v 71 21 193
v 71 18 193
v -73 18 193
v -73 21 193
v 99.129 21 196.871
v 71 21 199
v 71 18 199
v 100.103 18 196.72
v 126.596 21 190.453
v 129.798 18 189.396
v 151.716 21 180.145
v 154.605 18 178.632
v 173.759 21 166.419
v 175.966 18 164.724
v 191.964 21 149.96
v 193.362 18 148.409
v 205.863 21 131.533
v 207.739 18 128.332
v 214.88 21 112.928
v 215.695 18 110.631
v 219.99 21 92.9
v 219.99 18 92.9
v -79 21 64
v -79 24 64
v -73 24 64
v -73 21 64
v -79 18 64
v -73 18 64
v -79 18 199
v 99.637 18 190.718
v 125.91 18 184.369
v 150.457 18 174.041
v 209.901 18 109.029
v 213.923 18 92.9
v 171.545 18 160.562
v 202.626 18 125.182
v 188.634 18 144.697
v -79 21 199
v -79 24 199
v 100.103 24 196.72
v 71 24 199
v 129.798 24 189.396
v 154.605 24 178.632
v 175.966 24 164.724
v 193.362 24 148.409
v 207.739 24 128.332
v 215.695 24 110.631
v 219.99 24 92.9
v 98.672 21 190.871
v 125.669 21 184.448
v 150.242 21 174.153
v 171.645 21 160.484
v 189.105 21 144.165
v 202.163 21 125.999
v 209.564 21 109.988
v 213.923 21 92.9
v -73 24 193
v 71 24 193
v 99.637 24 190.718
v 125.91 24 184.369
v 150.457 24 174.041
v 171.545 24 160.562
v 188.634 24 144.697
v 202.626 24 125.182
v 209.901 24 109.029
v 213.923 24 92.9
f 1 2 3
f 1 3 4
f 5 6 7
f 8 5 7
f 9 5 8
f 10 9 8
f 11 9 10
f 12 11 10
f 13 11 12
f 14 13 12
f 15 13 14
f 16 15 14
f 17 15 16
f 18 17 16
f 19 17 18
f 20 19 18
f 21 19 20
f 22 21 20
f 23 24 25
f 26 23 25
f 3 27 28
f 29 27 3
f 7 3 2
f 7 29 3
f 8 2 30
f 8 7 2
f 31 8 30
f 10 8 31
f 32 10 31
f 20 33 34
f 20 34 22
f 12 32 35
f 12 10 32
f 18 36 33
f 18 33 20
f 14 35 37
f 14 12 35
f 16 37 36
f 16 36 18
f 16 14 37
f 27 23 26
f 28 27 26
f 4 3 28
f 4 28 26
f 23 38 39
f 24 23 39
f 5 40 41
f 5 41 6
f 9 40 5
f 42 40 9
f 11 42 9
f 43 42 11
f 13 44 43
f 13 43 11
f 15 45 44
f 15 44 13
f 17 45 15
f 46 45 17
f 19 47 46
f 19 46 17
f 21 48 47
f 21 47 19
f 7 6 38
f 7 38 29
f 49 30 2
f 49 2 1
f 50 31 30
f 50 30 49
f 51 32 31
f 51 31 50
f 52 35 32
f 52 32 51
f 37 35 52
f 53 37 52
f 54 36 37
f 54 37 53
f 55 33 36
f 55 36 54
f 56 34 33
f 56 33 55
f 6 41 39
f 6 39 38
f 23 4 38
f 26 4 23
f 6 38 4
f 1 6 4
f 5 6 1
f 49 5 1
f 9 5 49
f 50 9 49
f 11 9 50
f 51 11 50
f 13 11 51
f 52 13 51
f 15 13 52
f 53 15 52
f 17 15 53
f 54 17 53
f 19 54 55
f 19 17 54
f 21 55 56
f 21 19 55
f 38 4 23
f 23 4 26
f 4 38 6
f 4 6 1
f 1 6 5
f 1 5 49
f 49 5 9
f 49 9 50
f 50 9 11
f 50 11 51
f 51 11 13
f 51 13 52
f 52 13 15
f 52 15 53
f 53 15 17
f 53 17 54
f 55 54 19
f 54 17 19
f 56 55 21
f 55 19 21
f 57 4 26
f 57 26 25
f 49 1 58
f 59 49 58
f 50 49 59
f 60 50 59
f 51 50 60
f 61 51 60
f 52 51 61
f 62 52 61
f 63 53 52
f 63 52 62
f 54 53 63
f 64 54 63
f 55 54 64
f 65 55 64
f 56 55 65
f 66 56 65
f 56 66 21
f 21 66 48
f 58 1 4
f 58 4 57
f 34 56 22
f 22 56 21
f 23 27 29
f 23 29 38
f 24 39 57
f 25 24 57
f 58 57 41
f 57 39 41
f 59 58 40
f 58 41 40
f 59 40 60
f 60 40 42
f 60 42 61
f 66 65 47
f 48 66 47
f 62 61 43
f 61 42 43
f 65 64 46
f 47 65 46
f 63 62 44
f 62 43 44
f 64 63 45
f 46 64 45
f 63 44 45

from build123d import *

# Parameters (mm, degrees)
SKETCH3_W           = 6
SKETCH3_H           = 6
SKETCH6_W           = 6
SKETCH6_H           = 6
BOSS_EXTRUDE2_DEPTH = 15
SKETCH13_W          = 20.070411903
SKETCH13_H          = 20.135813936
CUT_EXTRUDE1_DEPTH  = 247.321355287


with BuildPart() as part:
    # Sweep2: sweep along a path in Sketch2
    with BuildLine() as sweep2_path:  # in the path sketch's own coordinates; laid on its plane below (add() does not lay a ready-made edge on the line's plane)
        Line((79, -79), (79, -199))
        Line((79, -199), (-71, -199))
        add(Edge.make_bspline(
            [(-71, -199), (-221, -199), (-221, -79)],
            knots=[0, 0, 0, 1.570796327, 1.570796327, 1.570796327], degree=2, weights=[1, 0.707106781, 1]))
    # Sketch3 → Sweep2 (sweep)
    with BuildSketch(Plane.XY.offset(79)):
        with Locations((-76, 21)):
            Rectangle(SKETCH3_W, SKETCH3_H)
    sweep(path=Plane(origin=(0, 21, 0), x_dir=(-1, 0, 0), z_dir=(0, -1, 0)) * sweep2_path.line, transition=Transition.RIGHT)

    # Sketch6 → Boss-Extrude2 (add)
    with BuildSketch(Plane.XY.offset(79)):
        with Locations((-76, 21)):
            Rectangle(SKETCH6_W, SKETCH6_H)
    extrude(amount=-BOSS_EXTRUDE2_DEPTH)

    # Sketch13 → Cut-Extrude1 (cut, through all)
    with BuildSketch(Plane.XY.offset(92.9)):
        with Locations((216.107136564, 22.218494932)):
            Rectangle(SKETCH13_W, SKETCH13_H)
    extrude(amount=-CUT_EXTRUDE1_DEPTH, mode=Mode.SUBTRACT)


with BuildPart() as body_2:
    # Split1: the piece on the far side of the plane
    add(part.part)
    split(bisect_by=Plane(origin=(0, 21, 0), x_dir=(0, 0, -1), z_dir=(0, -1, 0)), keep=Keep.BOTTOM)


with BuildPart() as part_1:
    add(part.part)

    # Split1
    split(bisect_by=Plane(origin=(0, 21, 0), x_dir=(0, 0, -1), z_dir=(0, -1, 0)), keep=Keep.TOP)


solid = Compound([body_2.part, part_1.part])
